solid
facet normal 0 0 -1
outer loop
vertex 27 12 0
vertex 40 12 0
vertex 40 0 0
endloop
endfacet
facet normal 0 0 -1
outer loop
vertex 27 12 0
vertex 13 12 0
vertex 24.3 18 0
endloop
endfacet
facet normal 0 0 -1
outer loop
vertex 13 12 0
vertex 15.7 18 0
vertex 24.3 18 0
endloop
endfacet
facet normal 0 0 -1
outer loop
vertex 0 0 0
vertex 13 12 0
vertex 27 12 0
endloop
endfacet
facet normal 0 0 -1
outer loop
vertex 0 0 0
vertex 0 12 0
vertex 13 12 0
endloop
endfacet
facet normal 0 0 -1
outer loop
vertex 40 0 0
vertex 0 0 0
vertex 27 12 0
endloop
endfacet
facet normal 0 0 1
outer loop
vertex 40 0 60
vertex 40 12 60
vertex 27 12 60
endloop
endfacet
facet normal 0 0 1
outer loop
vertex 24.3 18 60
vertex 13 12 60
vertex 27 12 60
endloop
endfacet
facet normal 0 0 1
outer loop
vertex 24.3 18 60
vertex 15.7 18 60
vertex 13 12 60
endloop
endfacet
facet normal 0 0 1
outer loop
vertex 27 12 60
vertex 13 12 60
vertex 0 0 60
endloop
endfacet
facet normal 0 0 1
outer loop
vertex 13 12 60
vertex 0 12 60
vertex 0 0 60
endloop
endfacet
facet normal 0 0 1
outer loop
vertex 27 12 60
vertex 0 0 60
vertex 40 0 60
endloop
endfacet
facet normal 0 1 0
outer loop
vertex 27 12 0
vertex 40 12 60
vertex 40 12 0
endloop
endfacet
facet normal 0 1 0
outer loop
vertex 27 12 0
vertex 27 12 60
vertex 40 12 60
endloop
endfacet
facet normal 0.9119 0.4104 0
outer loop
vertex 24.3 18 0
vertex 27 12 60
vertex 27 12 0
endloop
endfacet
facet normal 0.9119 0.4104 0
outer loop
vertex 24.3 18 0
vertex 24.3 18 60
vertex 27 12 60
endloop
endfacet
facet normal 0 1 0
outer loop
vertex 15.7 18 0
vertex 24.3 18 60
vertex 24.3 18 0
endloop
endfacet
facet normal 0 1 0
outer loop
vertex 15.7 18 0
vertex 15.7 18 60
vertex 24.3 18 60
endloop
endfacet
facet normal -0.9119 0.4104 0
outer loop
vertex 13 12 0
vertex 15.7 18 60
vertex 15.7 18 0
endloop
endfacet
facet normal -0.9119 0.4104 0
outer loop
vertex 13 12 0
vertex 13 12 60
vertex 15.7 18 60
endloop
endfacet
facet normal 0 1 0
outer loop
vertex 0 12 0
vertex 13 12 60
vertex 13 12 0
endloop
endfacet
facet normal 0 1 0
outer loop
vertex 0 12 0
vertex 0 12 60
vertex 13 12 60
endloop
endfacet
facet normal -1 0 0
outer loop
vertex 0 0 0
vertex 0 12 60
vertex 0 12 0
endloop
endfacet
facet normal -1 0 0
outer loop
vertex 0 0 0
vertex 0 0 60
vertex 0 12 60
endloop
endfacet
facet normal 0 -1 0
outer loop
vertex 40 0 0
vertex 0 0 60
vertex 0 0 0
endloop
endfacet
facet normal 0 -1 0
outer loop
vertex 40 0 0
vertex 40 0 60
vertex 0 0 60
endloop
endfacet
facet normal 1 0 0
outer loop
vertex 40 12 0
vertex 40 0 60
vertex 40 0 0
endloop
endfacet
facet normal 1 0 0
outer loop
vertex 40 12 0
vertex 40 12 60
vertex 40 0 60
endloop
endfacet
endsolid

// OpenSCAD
$fn = 32;

// ----------------------------------------------------------------------
// V guide rail: dovetail, 40 mm wide
// ----------------------------------------------------------------------

// --- parameters (mm) ---
rail_w = 40;              // rail width, X
base_t = 12;              // base plate thickness
v_depth = 6;              // V feature depth / height
v_half_w = 7;             // half width of the V at the base face
plate_t = 60;             // rail length, Z (the extrusion height)
top_half_w = 4.3;         // half width at the dovetail top

dovetail_base = 2 * v_half_w;  // dovetail width at the base
dovetail_top = 2 * top_half_w;  // dovetail width at the top

profile = [[0, 0], [40, 0], [40, 12], [27, 12], [24.3, 18], [15.7, 18], [13, 12], [0, 12]];  // primary outline, 8 points, counter clockwise

// --- the one profile operation ---
linear_extrude(height = plate_t) polygon(points = profile);
